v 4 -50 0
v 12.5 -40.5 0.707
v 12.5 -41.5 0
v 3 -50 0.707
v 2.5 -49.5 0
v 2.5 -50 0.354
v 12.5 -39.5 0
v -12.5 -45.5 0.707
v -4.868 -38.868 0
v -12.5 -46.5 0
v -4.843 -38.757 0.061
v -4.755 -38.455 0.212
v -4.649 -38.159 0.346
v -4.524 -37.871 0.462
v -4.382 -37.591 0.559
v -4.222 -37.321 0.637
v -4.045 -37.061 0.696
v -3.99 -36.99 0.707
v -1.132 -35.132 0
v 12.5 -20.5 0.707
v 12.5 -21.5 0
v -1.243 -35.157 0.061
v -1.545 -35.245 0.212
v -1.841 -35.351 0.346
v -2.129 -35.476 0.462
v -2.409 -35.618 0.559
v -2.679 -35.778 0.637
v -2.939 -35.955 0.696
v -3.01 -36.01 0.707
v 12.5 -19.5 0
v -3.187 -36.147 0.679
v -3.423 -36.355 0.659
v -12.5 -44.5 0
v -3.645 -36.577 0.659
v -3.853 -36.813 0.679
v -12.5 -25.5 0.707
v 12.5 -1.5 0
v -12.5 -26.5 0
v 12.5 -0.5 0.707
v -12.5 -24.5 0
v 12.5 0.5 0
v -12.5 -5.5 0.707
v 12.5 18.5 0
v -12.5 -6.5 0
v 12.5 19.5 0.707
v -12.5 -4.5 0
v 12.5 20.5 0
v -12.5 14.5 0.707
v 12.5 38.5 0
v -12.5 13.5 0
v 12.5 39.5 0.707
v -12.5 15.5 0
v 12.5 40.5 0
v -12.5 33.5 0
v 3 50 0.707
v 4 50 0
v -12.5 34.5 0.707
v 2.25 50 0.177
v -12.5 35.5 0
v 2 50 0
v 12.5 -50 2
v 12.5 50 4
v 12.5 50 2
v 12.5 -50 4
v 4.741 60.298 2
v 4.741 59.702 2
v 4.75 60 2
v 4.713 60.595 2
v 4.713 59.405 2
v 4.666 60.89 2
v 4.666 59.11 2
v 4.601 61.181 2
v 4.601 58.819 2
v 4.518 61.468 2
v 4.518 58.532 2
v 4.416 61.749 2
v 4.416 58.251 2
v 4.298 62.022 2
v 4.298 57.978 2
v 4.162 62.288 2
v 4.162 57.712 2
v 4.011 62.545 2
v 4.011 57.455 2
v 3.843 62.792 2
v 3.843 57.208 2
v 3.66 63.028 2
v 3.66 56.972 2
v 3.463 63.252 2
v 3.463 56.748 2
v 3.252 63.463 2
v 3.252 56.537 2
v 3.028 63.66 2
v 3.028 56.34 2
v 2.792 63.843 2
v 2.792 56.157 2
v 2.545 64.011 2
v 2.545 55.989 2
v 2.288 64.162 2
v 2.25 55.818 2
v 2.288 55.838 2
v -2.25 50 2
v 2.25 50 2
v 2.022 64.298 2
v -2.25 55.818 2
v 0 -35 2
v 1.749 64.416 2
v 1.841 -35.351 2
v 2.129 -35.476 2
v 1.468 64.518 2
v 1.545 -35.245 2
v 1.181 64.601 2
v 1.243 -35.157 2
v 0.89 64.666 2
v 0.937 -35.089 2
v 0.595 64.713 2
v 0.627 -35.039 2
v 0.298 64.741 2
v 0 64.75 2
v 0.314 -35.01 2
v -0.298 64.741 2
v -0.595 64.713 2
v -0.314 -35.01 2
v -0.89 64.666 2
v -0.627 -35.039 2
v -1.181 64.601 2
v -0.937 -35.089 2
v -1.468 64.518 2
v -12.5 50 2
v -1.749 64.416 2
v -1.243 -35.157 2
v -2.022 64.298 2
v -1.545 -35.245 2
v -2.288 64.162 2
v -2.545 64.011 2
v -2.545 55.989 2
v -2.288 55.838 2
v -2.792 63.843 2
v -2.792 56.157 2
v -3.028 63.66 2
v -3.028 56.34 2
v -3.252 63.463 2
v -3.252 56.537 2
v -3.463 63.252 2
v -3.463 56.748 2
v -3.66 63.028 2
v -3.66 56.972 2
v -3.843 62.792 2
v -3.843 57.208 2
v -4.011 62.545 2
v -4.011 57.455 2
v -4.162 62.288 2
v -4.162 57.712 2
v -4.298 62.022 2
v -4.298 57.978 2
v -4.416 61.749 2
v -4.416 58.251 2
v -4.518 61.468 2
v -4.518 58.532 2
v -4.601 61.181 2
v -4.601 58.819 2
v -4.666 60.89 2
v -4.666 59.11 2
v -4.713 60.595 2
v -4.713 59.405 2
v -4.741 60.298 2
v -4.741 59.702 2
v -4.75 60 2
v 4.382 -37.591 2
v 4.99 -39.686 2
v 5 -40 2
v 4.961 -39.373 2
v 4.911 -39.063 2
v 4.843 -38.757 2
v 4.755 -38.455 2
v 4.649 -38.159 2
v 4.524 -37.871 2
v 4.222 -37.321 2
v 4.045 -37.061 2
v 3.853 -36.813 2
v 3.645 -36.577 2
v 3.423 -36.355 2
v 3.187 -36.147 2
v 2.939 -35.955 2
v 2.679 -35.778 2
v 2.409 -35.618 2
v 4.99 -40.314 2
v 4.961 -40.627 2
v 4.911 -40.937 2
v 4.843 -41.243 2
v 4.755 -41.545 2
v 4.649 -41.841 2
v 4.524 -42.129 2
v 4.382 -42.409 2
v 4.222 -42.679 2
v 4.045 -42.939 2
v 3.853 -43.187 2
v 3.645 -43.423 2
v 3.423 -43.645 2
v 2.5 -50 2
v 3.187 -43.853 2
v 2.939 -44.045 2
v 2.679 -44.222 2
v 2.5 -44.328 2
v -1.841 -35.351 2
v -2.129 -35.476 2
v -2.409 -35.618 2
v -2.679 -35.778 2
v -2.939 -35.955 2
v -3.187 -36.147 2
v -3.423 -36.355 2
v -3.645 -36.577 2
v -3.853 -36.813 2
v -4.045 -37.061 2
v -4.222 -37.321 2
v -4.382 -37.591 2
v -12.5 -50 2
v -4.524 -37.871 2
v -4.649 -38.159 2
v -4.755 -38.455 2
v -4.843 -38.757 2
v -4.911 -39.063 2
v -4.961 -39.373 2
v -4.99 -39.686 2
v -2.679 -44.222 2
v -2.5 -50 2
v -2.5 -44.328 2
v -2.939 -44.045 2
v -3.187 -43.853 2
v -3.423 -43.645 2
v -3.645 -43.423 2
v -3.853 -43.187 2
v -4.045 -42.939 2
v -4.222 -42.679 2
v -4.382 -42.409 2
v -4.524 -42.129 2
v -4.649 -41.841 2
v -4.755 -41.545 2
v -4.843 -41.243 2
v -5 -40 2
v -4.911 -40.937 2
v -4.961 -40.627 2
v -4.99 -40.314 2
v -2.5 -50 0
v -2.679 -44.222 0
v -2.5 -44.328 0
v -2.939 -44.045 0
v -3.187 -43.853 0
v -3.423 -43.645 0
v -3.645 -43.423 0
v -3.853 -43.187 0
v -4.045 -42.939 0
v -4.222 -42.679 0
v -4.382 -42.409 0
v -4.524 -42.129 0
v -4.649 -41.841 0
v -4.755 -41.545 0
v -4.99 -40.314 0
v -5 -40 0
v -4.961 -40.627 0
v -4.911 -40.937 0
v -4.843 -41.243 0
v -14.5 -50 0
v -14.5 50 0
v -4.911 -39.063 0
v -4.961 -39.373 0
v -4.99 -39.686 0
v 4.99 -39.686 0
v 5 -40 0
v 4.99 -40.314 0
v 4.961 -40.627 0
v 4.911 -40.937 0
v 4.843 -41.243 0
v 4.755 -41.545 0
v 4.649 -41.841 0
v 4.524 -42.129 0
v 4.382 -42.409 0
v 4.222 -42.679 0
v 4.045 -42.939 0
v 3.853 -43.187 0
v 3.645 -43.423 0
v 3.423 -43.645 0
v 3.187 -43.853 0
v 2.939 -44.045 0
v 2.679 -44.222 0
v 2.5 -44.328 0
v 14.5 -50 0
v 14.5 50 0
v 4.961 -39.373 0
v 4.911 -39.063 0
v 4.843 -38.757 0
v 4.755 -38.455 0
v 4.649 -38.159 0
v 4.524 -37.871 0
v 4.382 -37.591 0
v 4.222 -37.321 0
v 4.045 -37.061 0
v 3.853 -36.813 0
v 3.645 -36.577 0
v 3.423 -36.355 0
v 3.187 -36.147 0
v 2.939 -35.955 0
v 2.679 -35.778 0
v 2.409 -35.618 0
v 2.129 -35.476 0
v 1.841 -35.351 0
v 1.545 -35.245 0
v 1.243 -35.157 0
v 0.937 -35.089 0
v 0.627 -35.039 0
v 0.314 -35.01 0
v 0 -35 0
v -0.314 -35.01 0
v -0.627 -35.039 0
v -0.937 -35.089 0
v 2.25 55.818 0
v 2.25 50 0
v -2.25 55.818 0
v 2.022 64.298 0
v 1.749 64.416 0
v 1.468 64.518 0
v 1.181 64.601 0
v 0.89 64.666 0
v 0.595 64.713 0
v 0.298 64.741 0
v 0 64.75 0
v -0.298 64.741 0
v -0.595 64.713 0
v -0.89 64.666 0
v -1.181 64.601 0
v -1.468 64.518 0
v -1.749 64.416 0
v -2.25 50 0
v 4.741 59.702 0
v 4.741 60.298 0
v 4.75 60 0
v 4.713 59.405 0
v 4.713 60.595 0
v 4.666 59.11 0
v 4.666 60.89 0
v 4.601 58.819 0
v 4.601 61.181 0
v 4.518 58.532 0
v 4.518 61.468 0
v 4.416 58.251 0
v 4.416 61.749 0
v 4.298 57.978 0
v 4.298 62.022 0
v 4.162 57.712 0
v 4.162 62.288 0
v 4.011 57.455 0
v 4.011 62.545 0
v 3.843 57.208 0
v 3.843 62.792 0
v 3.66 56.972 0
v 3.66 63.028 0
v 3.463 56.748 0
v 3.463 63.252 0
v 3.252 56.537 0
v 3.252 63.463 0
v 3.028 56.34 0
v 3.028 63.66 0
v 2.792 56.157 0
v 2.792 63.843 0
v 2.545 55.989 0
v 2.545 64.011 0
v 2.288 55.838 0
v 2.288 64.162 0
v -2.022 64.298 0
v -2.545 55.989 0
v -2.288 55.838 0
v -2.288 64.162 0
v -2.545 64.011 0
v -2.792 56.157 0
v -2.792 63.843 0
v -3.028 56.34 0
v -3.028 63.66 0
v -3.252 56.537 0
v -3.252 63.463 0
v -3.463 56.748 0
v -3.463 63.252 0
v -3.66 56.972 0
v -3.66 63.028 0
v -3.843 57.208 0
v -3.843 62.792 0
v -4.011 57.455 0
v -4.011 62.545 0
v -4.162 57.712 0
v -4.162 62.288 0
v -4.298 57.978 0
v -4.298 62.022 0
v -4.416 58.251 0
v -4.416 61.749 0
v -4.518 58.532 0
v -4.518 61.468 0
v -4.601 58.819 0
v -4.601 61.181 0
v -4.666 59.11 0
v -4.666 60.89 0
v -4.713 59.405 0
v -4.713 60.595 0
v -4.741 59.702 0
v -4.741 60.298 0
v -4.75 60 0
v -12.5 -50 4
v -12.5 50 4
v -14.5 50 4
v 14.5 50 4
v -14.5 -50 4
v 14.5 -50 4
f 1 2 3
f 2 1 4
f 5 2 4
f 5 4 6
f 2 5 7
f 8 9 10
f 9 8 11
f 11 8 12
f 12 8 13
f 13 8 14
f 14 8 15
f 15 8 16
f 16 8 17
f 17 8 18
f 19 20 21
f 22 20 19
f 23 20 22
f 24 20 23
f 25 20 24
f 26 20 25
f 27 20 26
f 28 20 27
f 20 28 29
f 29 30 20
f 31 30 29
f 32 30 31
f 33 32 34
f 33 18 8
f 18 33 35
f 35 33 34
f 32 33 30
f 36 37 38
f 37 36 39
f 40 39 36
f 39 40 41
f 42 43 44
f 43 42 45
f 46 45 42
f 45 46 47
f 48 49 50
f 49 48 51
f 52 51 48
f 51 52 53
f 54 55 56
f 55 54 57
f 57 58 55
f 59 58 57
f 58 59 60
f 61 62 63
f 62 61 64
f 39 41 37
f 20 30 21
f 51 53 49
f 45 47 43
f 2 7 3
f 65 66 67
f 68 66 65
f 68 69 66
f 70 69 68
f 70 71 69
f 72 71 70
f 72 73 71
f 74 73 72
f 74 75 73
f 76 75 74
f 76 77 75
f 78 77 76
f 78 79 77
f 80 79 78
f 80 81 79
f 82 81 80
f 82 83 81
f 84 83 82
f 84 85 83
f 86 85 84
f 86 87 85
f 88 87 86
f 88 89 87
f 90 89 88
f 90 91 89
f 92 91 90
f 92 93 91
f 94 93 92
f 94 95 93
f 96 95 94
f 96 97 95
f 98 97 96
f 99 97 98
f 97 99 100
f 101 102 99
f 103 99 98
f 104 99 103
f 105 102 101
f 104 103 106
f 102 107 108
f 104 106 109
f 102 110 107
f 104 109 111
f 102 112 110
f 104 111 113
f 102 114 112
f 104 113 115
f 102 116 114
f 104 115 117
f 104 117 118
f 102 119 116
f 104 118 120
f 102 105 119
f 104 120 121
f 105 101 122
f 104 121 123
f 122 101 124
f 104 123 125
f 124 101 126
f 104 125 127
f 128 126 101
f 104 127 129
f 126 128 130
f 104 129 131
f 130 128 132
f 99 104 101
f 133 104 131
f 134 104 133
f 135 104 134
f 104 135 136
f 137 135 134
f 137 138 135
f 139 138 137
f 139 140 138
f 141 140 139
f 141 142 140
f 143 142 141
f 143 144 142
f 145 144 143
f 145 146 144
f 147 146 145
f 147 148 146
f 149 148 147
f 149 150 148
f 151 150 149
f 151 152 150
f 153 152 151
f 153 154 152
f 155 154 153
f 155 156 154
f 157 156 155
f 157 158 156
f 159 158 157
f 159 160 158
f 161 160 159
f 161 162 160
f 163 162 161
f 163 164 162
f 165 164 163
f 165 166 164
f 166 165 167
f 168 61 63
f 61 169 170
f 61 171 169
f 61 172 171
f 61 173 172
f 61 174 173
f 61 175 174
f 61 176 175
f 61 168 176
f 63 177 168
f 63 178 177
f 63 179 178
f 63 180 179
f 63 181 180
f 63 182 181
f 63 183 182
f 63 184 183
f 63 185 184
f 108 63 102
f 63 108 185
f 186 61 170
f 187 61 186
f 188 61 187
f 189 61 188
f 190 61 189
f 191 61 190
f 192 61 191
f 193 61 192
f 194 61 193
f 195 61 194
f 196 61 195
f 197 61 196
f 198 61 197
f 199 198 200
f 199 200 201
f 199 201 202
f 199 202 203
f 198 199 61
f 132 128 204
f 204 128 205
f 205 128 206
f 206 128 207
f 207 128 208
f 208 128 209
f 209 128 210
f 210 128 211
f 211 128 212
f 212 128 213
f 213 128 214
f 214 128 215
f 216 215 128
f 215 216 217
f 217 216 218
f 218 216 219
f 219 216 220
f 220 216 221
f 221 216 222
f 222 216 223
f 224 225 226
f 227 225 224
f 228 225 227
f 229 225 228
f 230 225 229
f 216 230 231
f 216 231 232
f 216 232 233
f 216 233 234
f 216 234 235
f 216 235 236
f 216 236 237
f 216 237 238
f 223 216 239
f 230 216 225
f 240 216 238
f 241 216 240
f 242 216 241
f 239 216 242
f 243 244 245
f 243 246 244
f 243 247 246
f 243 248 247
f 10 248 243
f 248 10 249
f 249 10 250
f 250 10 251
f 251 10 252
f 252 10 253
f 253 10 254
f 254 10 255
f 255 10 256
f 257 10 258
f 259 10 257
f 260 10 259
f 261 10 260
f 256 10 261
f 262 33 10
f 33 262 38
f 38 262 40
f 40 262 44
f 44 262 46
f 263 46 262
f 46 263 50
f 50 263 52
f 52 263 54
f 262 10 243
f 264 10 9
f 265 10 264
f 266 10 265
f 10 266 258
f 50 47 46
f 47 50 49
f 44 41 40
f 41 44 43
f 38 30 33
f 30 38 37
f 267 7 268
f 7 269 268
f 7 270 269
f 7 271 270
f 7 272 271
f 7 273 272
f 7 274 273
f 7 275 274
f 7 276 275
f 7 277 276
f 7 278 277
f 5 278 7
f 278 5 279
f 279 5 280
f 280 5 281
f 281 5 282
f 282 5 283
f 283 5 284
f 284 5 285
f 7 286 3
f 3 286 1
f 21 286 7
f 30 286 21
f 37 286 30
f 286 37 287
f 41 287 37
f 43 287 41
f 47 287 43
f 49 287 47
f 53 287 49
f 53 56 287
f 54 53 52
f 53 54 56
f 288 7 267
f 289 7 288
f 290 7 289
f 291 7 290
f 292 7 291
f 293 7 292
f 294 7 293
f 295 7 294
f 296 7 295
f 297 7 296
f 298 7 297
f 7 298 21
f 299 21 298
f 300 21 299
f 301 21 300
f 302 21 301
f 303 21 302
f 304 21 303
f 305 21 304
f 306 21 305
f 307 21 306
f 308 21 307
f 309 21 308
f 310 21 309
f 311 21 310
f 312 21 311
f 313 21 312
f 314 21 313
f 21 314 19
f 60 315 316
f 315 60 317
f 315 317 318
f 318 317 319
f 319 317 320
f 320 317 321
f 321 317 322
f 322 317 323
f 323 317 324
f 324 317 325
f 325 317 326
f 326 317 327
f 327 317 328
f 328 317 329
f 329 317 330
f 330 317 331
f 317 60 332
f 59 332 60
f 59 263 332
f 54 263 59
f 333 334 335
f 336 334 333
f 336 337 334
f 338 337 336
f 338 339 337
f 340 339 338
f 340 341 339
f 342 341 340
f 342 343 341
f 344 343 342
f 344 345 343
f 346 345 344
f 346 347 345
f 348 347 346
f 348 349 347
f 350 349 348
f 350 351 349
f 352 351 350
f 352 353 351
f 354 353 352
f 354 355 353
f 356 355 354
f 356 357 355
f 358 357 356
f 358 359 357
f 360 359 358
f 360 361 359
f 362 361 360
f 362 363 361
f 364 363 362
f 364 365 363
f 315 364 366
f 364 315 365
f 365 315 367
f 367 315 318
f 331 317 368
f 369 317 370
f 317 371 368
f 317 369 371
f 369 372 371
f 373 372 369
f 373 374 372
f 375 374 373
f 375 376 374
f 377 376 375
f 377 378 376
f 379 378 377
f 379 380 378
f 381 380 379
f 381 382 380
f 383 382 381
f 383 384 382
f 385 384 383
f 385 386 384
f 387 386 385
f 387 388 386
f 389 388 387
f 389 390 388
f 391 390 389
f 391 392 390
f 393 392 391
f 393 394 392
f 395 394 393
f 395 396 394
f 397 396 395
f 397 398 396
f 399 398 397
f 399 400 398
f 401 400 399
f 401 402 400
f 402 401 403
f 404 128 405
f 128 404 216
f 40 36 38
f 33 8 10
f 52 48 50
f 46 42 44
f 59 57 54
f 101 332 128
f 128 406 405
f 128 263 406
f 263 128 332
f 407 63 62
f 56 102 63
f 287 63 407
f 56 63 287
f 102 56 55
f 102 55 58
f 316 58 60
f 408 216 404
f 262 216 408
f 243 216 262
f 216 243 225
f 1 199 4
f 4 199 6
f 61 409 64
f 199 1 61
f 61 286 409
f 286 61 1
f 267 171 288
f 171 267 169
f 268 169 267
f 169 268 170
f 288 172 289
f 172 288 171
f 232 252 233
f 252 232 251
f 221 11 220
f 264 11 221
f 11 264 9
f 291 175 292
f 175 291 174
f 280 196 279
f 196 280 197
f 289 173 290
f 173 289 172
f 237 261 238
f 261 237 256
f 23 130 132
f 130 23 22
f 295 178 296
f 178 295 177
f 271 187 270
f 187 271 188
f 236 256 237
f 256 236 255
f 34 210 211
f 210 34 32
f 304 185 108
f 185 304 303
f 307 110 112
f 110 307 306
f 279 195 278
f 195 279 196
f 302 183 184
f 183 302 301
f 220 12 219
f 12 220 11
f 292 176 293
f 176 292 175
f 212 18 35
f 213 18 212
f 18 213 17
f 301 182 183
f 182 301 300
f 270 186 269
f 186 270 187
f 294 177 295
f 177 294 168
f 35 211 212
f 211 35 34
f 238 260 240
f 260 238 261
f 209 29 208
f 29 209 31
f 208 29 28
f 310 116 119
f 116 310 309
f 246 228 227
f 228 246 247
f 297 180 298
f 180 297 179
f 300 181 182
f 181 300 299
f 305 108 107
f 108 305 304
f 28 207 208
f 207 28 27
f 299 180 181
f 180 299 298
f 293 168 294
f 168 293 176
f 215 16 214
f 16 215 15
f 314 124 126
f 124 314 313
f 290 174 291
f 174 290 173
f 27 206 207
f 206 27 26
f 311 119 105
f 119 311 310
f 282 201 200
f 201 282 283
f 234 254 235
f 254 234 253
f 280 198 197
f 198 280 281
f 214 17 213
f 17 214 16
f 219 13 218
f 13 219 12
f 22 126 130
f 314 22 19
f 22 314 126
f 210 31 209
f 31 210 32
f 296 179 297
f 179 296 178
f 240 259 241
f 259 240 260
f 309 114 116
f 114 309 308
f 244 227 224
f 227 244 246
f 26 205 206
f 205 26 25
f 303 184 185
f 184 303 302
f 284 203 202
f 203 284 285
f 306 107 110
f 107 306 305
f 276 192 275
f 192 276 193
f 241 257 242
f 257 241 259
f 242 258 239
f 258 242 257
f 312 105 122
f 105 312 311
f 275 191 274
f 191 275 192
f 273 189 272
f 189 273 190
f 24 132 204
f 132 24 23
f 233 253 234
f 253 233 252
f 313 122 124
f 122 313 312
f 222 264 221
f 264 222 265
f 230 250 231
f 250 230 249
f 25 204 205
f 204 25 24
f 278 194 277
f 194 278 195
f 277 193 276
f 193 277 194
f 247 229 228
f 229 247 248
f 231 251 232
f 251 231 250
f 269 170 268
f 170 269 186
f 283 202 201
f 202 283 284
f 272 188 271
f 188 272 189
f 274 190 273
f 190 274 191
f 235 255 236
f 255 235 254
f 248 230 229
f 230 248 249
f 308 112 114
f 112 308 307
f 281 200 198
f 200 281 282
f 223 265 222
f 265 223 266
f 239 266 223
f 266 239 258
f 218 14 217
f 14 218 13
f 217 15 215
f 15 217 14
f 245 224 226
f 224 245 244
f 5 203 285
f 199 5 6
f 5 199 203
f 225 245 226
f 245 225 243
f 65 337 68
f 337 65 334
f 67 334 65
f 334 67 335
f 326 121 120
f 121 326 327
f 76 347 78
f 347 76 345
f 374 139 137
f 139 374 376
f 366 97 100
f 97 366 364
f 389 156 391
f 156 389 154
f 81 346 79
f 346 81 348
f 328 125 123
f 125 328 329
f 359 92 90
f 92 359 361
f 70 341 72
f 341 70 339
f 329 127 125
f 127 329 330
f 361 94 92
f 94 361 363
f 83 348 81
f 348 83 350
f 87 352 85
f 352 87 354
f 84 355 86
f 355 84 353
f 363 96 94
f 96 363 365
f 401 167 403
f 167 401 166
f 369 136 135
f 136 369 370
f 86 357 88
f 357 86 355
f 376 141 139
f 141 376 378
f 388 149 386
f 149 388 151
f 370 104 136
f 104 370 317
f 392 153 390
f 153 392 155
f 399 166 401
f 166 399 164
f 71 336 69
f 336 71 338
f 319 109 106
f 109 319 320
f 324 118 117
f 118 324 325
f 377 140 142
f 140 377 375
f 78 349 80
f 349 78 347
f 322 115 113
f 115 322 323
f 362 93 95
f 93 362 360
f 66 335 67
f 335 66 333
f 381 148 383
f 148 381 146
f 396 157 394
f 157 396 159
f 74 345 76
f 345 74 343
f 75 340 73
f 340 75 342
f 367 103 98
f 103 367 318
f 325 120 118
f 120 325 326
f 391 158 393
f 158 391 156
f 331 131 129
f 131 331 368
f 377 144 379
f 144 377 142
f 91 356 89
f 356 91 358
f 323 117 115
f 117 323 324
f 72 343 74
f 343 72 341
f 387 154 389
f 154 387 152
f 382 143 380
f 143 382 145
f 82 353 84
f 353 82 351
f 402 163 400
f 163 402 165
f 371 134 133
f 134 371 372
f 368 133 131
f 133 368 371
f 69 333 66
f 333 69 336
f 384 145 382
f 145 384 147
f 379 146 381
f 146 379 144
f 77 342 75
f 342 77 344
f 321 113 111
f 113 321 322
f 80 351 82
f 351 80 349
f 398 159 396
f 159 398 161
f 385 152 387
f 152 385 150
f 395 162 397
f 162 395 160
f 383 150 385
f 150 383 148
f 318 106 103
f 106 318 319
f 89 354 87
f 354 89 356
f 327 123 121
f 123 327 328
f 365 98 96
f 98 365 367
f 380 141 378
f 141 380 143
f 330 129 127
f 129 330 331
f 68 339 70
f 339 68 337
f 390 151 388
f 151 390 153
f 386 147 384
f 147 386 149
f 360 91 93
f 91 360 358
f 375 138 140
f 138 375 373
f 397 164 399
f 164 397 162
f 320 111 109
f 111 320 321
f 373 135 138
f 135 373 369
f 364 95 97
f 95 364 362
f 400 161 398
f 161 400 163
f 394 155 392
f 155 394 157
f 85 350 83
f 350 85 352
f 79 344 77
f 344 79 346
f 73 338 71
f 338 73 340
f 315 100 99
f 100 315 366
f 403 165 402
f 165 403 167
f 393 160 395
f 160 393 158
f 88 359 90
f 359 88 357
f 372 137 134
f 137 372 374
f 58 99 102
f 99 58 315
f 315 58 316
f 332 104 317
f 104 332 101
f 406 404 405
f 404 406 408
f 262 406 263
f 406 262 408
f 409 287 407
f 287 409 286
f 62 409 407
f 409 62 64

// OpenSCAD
part = "straight"; // [curved_left:Curve Left,curved_right:Curve Right,straight:Straight,intersection:Intersection]

// Interior width of the track.
track_width = 25;
// Length of straight parts compared to width of the track.
track_length_to_width_ratio = 4;
track_length = track_width * track_length_to_width_ratio;
track_lip_width = 2;
track_lip_height = 2;
// Thickness of the track's base. Recommend a minimimum of at least 2mm.
track_base_height = 2;
// Radius of curved track vs. length of a straight track segment.
track_curve_radius_to_length_ratio = 1.3333;  
track_height = track_base_height + track_lip_height;
// Size of the ball joint.
ball_diameter = 10;
// The amount of gap to leave around the joined parts.  Varies by printer.  
join_tolerance = 0.5;  

/* [Hidden] */
$fn = 100;

/*
track_intersection();
translate([0,track_length,0]) track_straight();
translate([0,-track_length,0]) track_straight();
translate([track_length/2,-track_length/2+track_width/2+track_lip_width,0]) rotate([0,0,180]) track_curved_left();
translate([-track_length/2,track_length/2-track_width/2-track_lip_width,0]) rotate([0,0,-90]) track_curved_right();
*/

print_part();

module print_part() {
    if(part == "curved_left") {
        track_curved_left();
    } else if(part == "curved_right") {
        track_curved_right();
    } else if(part == "straight") {
        track_straight();
    } else if(part == "intersection") {
        track_intersection();
    }
}

module track_straight() {
    deck(track_width, track_length, track_base_height);
    translate([-track_width/2-track_lip_width,-track_length/2,0]) cube([track_lip_width, track_length, track_height]);
    translate([track_width/2,-track_length/2,0]) cube([track_lip_width, track_length, track_height]);
}

module track_curved_left() {
    curve_diameter = track_length / (track_curve_radius_to_length_ratio / 2);
    difference() {
        union() {
            difference() {
                cylinder(d=curve_diameter,h=track_height);
                translate([0,0,track_base_height]) cylinder(d=curve_diameter-track_lip_width*2,h=track_height);
            }
            cylinder(d=curve_diameter-((track_width+track_lip_width)*2),h=track_height);
        }
        translate([0,0,-1]) cylinder(d=curve_diameter-((track_width+track_lip_width*2)*2),h=track_height+2);
        translate([-100,0,-1]) cube([200,100,100]);
        translate([0,-100,-1]) cube([100,200,100]);
        translate([-curve_diameter/2+track_lip_width+track_width/2,-ball_diameter,-1]) cylinder(d=ball_diameter,h=track_base_height+2);
        translate([-curve_diameter/2+track_lip_width+track_width/2-ball_diameter/4,-ball_diameter,-1]) cube([ball_diameter/2,ball_diameter+1,track_base_height+2]);
        groove_size = 1;
        for(i=[-200:20:200]) {
            translate([-100,i + 3,0]) rotate([-45,90,0]) rotate([0,0,45]) translate([-groove_size/2,-groove_size/2,0]) cube([groove_size,groove_size,200]);
        }
    }
    translate([ball_diameter,-curve_diameter/2+track_lip_width+track_width/2,0]) cylinder(d=ball_diameter-join_tolerance,h=track_base_height);
    translate([0,-curve_diameter/2+track_lip_width+track_width/2-(ball_diameter/2-join_tolerance)/2,0]) cube([ball_diameter,ball_diameter/2-join_tolerance,track_base_height]);
}

module track_curved_right() {
    mirror() track_curved_left();
}

module track_intersection() {
    deck(track_width, track_length, track_base_height);
    rotate([0,0,90]) deck(track_width, track_length, track_base_height);
    
    for(i=[0:90:270]) {
        rotate([0,0,i]) track_intersection_quadrant();
    }
}

module track_intersection_quadrant() {
    inner_radius = track_width/2;
    difference() {
        union() {
            translate([track_width/2+inner_radius, track_width/2+inner_radius, 0]) cylinder(r=inner_radius, h=track_height);
            translate([track_width/2, track_width/2, 0]) cube([inner_radius, inner_radius, track_base_height]);
        }
        translate([track_width/2+inner_radius, track_width/2+inner_radius, -1]) cylinder(r=inner_radius-track_lip_width, h=track_height+2);
        translate([track_width/2+inner_radius, track_width/2+track_lip_width, -1]) cube([inner_radius*2+1,inner_radius*2+1,track_height*2+2]);
        translate([track_width/2+track_lip_width, track_width/2+inner_radius, -1]) cube([inner_radius*2+1,inner_radius*2+1,track_height*2+2]);
    }
    translate([track_width/2+inner_radius, track_width/2, 0]) cube([track_length/2-track_width/2-inner_radius, track_lip_width, track_height]);
    translate([track_width/2, track_width/2+inner_radius, 0]) cube([track_lip_width, track_length/2-track_width/2-inner_radius, track_height]);
}

module deck(x, y, z) {
    difference() {
        translate([-x/2,-y/2,0]) cube([x,y,z]);
        
        translate([0,-y/2+ball_diameter,-1]) cylinder(d=ball_diameter,h=z+2);
        translate([-ball_diameter/4,-y/2-1,-1]) cube([ball_diameter/2,ball_diameter,z+2]);
        groove_size = 1;
        for(i=[-200:20:200]) {
            translate([-100,i - 13,0]) rotate([-45,90,0]) rotate([0,0,45]) translate([-groove_size/2,-groove_size/2,0]) cube([groove_size,groove_size,200]);
        }
    }
    translate([0,y/2+ball_diameter,0]) cylinder(d=ball_diameter-join_tolerance,h=z);
    translate([-(ball_diameter/2-join_tolerance)/2,y/2,0]) cube([ball_diameter/2-join_tolerance,ball_diameter,z]);
}
